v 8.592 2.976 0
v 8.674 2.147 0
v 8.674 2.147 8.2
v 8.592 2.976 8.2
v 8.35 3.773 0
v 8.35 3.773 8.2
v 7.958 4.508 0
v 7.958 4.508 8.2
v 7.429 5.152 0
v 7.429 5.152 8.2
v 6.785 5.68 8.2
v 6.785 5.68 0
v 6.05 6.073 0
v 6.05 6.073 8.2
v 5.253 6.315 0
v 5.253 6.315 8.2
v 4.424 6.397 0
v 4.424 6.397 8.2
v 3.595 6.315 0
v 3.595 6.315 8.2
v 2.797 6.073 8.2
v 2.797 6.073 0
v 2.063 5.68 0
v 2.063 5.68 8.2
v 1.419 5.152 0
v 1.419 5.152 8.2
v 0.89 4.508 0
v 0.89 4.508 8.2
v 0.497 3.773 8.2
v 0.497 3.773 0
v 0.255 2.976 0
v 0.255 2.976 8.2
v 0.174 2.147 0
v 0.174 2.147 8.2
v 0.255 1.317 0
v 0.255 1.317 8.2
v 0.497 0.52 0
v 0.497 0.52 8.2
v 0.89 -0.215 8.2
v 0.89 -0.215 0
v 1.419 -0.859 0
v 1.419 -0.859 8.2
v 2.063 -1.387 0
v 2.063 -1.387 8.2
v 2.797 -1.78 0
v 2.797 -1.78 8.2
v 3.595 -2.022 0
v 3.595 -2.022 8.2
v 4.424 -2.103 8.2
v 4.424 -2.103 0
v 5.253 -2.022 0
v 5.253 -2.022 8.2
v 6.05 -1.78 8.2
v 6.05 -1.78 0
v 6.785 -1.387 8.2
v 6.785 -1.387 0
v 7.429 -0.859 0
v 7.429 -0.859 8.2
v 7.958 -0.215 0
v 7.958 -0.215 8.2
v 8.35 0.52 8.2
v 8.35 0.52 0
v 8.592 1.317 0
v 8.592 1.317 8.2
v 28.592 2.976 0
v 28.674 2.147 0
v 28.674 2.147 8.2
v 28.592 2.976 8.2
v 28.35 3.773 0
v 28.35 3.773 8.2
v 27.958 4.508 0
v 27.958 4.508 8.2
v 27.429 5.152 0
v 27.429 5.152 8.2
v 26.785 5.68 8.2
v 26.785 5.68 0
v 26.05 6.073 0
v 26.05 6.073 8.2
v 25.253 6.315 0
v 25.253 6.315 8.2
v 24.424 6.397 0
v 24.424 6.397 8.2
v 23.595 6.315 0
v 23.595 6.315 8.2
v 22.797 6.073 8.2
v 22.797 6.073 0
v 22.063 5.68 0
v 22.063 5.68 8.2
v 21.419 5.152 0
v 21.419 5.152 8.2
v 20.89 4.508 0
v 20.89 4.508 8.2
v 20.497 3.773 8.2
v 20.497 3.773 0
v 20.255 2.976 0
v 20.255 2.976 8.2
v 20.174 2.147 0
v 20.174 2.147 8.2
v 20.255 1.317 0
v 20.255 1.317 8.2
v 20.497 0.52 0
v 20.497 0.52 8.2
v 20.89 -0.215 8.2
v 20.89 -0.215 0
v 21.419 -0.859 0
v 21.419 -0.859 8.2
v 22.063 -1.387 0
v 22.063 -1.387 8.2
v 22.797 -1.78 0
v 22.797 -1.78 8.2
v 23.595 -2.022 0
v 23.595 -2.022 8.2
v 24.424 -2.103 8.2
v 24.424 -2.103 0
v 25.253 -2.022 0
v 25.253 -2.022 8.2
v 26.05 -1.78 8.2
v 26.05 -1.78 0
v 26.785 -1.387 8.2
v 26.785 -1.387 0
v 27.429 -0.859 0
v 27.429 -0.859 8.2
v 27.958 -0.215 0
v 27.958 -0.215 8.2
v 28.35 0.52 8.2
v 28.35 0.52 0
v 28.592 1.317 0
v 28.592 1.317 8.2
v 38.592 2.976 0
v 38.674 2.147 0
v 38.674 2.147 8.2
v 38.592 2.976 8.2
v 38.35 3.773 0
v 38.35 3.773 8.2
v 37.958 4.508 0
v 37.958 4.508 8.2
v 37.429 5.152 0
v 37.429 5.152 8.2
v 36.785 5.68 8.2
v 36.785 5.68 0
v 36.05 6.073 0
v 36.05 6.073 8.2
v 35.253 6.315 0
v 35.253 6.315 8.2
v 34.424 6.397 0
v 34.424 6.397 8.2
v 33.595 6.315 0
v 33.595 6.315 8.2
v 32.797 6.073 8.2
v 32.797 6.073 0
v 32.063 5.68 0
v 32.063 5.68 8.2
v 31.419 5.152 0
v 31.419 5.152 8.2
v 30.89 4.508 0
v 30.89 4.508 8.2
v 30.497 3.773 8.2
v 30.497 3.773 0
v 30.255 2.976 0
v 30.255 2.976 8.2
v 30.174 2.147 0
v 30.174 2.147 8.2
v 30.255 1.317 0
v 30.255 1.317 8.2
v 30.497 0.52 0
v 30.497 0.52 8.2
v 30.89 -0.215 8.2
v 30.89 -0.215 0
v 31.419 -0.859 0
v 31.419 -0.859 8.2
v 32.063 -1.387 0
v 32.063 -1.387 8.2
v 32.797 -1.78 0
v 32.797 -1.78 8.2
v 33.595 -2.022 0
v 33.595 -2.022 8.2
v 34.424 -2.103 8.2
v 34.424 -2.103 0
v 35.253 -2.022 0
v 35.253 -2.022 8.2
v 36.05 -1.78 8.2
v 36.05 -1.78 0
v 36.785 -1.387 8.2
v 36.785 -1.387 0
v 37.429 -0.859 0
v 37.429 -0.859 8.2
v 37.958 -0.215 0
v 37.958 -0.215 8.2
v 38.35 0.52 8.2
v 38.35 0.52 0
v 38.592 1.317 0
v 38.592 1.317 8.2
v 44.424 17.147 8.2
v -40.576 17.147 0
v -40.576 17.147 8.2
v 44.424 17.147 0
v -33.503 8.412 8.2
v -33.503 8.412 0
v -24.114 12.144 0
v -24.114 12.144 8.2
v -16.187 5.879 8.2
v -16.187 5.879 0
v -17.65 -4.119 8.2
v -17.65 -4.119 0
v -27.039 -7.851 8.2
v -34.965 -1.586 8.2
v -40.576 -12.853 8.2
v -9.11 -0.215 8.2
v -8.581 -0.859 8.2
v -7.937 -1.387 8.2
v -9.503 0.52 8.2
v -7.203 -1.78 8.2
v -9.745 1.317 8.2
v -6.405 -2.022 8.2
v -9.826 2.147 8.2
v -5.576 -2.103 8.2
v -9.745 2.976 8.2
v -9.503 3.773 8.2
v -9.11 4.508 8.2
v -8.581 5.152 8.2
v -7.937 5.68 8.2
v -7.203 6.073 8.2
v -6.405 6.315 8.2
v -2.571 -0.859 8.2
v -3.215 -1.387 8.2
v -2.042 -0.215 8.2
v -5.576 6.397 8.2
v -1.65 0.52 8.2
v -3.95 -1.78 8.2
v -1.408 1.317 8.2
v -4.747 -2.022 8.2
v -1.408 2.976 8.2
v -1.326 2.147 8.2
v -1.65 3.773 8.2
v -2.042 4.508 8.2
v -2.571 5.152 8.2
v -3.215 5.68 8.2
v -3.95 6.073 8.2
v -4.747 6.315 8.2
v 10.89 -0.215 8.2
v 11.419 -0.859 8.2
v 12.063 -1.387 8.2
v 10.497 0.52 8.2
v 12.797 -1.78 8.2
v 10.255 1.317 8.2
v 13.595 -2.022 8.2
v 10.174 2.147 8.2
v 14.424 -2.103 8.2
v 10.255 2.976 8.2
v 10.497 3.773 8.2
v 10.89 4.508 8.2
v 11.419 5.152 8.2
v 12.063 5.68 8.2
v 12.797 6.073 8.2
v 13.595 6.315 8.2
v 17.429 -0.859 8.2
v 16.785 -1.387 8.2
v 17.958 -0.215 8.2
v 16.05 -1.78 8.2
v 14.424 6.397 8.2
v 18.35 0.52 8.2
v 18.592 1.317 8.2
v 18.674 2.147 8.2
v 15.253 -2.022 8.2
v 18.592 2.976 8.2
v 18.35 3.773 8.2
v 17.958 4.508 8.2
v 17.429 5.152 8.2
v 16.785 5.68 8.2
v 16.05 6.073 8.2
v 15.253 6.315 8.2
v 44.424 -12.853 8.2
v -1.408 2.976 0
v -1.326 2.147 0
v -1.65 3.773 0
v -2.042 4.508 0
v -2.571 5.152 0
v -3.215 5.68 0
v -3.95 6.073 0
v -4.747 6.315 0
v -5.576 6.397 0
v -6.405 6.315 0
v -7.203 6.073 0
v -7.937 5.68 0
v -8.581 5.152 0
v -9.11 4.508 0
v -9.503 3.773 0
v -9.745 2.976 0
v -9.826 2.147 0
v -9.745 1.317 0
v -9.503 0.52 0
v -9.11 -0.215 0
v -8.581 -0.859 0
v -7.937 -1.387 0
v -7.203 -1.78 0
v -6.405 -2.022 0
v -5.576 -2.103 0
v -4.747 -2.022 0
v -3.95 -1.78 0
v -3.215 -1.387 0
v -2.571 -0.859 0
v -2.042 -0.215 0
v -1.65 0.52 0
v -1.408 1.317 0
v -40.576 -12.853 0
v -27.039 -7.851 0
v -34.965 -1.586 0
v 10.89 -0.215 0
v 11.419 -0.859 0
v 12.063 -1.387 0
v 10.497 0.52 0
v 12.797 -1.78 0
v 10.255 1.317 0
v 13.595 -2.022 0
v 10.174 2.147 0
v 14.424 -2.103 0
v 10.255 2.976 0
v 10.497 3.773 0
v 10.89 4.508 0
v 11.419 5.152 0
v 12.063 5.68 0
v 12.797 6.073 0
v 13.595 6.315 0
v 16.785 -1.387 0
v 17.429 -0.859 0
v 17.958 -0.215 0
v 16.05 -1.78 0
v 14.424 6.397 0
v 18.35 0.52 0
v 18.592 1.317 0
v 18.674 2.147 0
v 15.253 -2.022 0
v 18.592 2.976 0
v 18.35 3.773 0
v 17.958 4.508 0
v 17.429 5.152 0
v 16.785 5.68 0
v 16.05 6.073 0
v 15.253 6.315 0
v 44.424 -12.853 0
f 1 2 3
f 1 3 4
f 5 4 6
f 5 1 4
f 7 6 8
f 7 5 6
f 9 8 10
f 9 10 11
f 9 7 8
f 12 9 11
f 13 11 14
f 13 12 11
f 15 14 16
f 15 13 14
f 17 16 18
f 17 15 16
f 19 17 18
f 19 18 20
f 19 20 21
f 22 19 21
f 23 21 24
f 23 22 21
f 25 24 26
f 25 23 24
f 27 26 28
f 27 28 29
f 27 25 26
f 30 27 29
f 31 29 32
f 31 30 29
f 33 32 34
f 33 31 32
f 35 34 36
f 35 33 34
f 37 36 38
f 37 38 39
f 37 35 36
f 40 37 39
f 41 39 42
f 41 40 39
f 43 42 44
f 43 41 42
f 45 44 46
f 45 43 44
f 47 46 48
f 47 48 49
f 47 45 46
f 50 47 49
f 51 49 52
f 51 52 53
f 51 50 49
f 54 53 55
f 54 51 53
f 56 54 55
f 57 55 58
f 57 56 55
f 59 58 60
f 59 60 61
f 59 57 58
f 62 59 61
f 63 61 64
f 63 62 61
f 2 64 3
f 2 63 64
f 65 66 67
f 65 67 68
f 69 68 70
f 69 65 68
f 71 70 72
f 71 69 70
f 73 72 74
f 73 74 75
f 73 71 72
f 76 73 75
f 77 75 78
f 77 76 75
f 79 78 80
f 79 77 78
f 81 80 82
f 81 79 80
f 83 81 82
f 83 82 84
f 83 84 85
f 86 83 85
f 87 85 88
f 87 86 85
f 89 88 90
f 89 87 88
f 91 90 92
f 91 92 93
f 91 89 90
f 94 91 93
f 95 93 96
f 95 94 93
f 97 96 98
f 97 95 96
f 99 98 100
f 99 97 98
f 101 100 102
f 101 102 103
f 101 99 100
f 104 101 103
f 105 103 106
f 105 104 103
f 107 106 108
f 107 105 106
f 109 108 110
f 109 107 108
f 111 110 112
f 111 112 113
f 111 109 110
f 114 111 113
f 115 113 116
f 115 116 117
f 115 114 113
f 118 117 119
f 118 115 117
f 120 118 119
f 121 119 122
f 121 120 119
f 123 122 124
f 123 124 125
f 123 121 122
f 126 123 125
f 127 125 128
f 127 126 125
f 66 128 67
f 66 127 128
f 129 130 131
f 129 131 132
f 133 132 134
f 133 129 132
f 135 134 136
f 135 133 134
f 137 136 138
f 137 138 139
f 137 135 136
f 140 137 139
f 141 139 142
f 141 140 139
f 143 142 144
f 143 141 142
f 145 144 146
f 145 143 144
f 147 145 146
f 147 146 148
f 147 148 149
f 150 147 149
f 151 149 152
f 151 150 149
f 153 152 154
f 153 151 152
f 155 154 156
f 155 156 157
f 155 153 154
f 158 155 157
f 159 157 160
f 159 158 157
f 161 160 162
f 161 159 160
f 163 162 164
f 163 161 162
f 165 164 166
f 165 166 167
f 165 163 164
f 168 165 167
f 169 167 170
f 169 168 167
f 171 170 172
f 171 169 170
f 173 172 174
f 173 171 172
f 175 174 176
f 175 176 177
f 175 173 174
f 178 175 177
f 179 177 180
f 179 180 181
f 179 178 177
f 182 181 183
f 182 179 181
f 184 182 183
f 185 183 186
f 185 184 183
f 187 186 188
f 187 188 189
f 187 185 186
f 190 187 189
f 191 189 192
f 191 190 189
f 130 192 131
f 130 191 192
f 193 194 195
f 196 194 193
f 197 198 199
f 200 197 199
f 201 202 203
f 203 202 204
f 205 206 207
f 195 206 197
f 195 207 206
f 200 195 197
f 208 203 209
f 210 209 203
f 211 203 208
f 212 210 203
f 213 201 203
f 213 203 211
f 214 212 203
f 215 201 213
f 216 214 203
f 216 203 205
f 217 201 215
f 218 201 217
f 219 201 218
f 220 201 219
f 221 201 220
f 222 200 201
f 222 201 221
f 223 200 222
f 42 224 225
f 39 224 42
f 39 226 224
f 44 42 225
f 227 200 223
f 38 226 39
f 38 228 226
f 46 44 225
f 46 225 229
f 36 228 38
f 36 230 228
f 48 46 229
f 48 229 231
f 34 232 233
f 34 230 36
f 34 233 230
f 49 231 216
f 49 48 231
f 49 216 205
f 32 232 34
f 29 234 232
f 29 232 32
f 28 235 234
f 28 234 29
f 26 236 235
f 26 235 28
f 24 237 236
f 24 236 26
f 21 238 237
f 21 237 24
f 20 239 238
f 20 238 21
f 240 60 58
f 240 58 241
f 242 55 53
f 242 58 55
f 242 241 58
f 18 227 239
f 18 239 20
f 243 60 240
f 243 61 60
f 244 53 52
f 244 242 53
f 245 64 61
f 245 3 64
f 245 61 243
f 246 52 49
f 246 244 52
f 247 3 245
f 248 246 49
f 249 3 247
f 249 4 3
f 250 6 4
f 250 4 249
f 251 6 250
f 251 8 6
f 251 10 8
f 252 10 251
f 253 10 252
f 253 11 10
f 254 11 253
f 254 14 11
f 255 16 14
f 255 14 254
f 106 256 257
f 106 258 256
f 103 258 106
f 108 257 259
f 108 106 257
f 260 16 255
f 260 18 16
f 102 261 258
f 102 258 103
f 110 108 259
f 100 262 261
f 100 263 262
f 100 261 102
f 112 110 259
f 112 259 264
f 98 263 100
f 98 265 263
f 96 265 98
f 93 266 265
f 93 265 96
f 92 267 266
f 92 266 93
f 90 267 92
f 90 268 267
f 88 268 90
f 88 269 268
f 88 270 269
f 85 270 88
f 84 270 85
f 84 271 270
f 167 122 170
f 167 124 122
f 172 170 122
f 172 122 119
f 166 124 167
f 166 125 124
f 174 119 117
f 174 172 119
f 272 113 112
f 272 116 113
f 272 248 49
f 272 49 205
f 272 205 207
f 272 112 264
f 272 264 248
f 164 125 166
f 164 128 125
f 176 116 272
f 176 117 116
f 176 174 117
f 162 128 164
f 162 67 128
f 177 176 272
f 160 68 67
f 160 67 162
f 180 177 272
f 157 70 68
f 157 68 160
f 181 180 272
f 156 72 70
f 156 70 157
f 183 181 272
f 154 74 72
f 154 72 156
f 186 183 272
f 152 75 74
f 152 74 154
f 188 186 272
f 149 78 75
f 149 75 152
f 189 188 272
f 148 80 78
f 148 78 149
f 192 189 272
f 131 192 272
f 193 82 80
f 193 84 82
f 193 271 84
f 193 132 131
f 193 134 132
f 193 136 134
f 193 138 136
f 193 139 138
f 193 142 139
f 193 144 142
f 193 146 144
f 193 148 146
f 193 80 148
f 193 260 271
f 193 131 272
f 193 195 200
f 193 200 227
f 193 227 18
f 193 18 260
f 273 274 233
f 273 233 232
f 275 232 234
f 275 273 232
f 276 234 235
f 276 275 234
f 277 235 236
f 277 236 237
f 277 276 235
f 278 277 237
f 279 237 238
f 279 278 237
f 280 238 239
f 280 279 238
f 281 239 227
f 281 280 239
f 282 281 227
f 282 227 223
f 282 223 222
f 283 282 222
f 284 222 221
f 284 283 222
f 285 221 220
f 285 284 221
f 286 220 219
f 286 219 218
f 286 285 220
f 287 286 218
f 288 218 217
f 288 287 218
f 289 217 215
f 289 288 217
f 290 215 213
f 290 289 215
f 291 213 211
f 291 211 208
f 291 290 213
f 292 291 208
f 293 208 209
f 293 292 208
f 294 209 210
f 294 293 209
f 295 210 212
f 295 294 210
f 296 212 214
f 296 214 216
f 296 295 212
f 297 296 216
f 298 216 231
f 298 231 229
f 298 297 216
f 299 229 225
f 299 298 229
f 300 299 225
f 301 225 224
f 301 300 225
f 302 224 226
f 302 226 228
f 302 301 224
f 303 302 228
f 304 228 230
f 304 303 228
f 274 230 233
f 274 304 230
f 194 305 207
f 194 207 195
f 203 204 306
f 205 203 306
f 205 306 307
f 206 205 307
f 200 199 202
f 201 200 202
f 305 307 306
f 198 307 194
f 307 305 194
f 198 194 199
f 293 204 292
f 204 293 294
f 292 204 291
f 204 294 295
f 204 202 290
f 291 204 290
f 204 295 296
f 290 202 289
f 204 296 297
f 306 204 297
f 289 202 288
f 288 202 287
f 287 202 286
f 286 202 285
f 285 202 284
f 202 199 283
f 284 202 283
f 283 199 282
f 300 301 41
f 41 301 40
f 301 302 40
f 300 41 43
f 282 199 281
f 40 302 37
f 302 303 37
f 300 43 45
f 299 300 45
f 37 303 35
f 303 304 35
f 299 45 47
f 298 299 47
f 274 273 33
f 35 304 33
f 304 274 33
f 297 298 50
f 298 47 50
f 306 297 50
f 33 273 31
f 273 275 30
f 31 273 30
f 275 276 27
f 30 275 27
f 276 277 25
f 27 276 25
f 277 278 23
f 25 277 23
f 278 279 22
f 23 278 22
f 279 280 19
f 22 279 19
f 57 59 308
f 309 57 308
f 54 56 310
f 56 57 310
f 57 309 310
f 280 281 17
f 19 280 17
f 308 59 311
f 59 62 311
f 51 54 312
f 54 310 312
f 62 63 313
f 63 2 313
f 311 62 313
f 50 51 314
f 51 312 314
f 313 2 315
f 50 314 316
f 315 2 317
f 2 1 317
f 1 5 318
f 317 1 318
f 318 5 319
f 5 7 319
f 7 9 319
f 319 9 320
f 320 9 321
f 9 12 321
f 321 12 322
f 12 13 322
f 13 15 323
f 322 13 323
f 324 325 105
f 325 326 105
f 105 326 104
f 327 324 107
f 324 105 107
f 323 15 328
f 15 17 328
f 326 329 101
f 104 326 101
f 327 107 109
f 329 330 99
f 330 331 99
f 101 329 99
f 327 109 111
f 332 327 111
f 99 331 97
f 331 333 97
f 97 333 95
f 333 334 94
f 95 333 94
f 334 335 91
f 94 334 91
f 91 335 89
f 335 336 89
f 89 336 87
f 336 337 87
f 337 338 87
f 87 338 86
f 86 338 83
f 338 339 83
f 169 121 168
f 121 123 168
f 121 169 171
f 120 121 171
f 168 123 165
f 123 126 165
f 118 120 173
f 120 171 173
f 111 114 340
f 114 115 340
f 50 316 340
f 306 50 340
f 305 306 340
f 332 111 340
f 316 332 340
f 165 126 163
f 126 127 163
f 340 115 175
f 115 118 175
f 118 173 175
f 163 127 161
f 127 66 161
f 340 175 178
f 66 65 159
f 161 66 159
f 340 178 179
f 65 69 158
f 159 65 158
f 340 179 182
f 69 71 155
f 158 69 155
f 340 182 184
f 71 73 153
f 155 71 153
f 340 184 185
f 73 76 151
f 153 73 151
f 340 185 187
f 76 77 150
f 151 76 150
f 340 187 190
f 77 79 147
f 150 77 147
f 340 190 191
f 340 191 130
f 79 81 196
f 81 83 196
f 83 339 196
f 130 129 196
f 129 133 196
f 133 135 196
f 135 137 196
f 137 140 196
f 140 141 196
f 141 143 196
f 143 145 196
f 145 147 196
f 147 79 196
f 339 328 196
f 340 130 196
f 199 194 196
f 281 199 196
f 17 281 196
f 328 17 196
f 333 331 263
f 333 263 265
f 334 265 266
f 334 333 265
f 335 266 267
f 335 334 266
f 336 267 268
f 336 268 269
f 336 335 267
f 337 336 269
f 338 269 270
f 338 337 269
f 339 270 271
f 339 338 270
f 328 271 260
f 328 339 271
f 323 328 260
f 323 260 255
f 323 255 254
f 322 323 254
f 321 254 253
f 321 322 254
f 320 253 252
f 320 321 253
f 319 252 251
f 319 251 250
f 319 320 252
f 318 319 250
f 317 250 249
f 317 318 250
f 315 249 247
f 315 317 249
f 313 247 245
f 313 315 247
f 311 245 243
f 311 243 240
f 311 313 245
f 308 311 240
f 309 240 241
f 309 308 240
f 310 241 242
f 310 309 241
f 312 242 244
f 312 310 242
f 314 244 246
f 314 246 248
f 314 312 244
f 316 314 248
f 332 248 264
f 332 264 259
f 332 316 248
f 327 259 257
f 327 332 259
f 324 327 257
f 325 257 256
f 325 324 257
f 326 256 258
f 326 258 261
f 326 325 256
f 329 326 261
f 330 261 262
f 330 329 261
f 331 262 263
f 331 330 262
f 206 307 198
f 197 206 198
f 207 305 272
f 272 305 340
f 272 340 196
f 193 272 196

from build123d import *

# Parameters (mm, degrees)
F0_W     = 85
F0_H     = 30
F0_R     = 4.25
F1_DEPTH = 8.2


with BuildPart() as f1:
    # F0 (on Top) → F1 (new body)
    with BuildSketch(Plane.XY):
        with Locations((1.923828, 2.146574)):
            Rectangle(F0_W, F0_H)
        with Locations((-5.576172, 2.146574)):
            Circle(F0_R, mode=Mode.SUBTRACT)
        with Locations((4.423828, 2.146574)):
            Circle(F0_R, mode=Mode.SUBTRACT)
        with Locations((14.423828, 2.146574)):
            Circle(F0_R, mode=Mode.SUBTRACT)
        with Locations((24.423828, 2.146574)):
            Circle(F0_R, mode=Mode.SUBTRACT)
        with Locations((34.423828, 2.146574)):
            Circle(F0_R, mode=Mode.SUBTRACT)
        Polygon((-34.96525, -1.585525), (-33.502803, 8.411704), (-24.113726, 12.143802), (-16.187095, 5.878672), (-17.649542, -4.118557), (-27.038619, -7.850655), align=None, mode=Mode.SUBTRACT)
    extrude(amount=F1_DEPTH)


solid = f1.part
